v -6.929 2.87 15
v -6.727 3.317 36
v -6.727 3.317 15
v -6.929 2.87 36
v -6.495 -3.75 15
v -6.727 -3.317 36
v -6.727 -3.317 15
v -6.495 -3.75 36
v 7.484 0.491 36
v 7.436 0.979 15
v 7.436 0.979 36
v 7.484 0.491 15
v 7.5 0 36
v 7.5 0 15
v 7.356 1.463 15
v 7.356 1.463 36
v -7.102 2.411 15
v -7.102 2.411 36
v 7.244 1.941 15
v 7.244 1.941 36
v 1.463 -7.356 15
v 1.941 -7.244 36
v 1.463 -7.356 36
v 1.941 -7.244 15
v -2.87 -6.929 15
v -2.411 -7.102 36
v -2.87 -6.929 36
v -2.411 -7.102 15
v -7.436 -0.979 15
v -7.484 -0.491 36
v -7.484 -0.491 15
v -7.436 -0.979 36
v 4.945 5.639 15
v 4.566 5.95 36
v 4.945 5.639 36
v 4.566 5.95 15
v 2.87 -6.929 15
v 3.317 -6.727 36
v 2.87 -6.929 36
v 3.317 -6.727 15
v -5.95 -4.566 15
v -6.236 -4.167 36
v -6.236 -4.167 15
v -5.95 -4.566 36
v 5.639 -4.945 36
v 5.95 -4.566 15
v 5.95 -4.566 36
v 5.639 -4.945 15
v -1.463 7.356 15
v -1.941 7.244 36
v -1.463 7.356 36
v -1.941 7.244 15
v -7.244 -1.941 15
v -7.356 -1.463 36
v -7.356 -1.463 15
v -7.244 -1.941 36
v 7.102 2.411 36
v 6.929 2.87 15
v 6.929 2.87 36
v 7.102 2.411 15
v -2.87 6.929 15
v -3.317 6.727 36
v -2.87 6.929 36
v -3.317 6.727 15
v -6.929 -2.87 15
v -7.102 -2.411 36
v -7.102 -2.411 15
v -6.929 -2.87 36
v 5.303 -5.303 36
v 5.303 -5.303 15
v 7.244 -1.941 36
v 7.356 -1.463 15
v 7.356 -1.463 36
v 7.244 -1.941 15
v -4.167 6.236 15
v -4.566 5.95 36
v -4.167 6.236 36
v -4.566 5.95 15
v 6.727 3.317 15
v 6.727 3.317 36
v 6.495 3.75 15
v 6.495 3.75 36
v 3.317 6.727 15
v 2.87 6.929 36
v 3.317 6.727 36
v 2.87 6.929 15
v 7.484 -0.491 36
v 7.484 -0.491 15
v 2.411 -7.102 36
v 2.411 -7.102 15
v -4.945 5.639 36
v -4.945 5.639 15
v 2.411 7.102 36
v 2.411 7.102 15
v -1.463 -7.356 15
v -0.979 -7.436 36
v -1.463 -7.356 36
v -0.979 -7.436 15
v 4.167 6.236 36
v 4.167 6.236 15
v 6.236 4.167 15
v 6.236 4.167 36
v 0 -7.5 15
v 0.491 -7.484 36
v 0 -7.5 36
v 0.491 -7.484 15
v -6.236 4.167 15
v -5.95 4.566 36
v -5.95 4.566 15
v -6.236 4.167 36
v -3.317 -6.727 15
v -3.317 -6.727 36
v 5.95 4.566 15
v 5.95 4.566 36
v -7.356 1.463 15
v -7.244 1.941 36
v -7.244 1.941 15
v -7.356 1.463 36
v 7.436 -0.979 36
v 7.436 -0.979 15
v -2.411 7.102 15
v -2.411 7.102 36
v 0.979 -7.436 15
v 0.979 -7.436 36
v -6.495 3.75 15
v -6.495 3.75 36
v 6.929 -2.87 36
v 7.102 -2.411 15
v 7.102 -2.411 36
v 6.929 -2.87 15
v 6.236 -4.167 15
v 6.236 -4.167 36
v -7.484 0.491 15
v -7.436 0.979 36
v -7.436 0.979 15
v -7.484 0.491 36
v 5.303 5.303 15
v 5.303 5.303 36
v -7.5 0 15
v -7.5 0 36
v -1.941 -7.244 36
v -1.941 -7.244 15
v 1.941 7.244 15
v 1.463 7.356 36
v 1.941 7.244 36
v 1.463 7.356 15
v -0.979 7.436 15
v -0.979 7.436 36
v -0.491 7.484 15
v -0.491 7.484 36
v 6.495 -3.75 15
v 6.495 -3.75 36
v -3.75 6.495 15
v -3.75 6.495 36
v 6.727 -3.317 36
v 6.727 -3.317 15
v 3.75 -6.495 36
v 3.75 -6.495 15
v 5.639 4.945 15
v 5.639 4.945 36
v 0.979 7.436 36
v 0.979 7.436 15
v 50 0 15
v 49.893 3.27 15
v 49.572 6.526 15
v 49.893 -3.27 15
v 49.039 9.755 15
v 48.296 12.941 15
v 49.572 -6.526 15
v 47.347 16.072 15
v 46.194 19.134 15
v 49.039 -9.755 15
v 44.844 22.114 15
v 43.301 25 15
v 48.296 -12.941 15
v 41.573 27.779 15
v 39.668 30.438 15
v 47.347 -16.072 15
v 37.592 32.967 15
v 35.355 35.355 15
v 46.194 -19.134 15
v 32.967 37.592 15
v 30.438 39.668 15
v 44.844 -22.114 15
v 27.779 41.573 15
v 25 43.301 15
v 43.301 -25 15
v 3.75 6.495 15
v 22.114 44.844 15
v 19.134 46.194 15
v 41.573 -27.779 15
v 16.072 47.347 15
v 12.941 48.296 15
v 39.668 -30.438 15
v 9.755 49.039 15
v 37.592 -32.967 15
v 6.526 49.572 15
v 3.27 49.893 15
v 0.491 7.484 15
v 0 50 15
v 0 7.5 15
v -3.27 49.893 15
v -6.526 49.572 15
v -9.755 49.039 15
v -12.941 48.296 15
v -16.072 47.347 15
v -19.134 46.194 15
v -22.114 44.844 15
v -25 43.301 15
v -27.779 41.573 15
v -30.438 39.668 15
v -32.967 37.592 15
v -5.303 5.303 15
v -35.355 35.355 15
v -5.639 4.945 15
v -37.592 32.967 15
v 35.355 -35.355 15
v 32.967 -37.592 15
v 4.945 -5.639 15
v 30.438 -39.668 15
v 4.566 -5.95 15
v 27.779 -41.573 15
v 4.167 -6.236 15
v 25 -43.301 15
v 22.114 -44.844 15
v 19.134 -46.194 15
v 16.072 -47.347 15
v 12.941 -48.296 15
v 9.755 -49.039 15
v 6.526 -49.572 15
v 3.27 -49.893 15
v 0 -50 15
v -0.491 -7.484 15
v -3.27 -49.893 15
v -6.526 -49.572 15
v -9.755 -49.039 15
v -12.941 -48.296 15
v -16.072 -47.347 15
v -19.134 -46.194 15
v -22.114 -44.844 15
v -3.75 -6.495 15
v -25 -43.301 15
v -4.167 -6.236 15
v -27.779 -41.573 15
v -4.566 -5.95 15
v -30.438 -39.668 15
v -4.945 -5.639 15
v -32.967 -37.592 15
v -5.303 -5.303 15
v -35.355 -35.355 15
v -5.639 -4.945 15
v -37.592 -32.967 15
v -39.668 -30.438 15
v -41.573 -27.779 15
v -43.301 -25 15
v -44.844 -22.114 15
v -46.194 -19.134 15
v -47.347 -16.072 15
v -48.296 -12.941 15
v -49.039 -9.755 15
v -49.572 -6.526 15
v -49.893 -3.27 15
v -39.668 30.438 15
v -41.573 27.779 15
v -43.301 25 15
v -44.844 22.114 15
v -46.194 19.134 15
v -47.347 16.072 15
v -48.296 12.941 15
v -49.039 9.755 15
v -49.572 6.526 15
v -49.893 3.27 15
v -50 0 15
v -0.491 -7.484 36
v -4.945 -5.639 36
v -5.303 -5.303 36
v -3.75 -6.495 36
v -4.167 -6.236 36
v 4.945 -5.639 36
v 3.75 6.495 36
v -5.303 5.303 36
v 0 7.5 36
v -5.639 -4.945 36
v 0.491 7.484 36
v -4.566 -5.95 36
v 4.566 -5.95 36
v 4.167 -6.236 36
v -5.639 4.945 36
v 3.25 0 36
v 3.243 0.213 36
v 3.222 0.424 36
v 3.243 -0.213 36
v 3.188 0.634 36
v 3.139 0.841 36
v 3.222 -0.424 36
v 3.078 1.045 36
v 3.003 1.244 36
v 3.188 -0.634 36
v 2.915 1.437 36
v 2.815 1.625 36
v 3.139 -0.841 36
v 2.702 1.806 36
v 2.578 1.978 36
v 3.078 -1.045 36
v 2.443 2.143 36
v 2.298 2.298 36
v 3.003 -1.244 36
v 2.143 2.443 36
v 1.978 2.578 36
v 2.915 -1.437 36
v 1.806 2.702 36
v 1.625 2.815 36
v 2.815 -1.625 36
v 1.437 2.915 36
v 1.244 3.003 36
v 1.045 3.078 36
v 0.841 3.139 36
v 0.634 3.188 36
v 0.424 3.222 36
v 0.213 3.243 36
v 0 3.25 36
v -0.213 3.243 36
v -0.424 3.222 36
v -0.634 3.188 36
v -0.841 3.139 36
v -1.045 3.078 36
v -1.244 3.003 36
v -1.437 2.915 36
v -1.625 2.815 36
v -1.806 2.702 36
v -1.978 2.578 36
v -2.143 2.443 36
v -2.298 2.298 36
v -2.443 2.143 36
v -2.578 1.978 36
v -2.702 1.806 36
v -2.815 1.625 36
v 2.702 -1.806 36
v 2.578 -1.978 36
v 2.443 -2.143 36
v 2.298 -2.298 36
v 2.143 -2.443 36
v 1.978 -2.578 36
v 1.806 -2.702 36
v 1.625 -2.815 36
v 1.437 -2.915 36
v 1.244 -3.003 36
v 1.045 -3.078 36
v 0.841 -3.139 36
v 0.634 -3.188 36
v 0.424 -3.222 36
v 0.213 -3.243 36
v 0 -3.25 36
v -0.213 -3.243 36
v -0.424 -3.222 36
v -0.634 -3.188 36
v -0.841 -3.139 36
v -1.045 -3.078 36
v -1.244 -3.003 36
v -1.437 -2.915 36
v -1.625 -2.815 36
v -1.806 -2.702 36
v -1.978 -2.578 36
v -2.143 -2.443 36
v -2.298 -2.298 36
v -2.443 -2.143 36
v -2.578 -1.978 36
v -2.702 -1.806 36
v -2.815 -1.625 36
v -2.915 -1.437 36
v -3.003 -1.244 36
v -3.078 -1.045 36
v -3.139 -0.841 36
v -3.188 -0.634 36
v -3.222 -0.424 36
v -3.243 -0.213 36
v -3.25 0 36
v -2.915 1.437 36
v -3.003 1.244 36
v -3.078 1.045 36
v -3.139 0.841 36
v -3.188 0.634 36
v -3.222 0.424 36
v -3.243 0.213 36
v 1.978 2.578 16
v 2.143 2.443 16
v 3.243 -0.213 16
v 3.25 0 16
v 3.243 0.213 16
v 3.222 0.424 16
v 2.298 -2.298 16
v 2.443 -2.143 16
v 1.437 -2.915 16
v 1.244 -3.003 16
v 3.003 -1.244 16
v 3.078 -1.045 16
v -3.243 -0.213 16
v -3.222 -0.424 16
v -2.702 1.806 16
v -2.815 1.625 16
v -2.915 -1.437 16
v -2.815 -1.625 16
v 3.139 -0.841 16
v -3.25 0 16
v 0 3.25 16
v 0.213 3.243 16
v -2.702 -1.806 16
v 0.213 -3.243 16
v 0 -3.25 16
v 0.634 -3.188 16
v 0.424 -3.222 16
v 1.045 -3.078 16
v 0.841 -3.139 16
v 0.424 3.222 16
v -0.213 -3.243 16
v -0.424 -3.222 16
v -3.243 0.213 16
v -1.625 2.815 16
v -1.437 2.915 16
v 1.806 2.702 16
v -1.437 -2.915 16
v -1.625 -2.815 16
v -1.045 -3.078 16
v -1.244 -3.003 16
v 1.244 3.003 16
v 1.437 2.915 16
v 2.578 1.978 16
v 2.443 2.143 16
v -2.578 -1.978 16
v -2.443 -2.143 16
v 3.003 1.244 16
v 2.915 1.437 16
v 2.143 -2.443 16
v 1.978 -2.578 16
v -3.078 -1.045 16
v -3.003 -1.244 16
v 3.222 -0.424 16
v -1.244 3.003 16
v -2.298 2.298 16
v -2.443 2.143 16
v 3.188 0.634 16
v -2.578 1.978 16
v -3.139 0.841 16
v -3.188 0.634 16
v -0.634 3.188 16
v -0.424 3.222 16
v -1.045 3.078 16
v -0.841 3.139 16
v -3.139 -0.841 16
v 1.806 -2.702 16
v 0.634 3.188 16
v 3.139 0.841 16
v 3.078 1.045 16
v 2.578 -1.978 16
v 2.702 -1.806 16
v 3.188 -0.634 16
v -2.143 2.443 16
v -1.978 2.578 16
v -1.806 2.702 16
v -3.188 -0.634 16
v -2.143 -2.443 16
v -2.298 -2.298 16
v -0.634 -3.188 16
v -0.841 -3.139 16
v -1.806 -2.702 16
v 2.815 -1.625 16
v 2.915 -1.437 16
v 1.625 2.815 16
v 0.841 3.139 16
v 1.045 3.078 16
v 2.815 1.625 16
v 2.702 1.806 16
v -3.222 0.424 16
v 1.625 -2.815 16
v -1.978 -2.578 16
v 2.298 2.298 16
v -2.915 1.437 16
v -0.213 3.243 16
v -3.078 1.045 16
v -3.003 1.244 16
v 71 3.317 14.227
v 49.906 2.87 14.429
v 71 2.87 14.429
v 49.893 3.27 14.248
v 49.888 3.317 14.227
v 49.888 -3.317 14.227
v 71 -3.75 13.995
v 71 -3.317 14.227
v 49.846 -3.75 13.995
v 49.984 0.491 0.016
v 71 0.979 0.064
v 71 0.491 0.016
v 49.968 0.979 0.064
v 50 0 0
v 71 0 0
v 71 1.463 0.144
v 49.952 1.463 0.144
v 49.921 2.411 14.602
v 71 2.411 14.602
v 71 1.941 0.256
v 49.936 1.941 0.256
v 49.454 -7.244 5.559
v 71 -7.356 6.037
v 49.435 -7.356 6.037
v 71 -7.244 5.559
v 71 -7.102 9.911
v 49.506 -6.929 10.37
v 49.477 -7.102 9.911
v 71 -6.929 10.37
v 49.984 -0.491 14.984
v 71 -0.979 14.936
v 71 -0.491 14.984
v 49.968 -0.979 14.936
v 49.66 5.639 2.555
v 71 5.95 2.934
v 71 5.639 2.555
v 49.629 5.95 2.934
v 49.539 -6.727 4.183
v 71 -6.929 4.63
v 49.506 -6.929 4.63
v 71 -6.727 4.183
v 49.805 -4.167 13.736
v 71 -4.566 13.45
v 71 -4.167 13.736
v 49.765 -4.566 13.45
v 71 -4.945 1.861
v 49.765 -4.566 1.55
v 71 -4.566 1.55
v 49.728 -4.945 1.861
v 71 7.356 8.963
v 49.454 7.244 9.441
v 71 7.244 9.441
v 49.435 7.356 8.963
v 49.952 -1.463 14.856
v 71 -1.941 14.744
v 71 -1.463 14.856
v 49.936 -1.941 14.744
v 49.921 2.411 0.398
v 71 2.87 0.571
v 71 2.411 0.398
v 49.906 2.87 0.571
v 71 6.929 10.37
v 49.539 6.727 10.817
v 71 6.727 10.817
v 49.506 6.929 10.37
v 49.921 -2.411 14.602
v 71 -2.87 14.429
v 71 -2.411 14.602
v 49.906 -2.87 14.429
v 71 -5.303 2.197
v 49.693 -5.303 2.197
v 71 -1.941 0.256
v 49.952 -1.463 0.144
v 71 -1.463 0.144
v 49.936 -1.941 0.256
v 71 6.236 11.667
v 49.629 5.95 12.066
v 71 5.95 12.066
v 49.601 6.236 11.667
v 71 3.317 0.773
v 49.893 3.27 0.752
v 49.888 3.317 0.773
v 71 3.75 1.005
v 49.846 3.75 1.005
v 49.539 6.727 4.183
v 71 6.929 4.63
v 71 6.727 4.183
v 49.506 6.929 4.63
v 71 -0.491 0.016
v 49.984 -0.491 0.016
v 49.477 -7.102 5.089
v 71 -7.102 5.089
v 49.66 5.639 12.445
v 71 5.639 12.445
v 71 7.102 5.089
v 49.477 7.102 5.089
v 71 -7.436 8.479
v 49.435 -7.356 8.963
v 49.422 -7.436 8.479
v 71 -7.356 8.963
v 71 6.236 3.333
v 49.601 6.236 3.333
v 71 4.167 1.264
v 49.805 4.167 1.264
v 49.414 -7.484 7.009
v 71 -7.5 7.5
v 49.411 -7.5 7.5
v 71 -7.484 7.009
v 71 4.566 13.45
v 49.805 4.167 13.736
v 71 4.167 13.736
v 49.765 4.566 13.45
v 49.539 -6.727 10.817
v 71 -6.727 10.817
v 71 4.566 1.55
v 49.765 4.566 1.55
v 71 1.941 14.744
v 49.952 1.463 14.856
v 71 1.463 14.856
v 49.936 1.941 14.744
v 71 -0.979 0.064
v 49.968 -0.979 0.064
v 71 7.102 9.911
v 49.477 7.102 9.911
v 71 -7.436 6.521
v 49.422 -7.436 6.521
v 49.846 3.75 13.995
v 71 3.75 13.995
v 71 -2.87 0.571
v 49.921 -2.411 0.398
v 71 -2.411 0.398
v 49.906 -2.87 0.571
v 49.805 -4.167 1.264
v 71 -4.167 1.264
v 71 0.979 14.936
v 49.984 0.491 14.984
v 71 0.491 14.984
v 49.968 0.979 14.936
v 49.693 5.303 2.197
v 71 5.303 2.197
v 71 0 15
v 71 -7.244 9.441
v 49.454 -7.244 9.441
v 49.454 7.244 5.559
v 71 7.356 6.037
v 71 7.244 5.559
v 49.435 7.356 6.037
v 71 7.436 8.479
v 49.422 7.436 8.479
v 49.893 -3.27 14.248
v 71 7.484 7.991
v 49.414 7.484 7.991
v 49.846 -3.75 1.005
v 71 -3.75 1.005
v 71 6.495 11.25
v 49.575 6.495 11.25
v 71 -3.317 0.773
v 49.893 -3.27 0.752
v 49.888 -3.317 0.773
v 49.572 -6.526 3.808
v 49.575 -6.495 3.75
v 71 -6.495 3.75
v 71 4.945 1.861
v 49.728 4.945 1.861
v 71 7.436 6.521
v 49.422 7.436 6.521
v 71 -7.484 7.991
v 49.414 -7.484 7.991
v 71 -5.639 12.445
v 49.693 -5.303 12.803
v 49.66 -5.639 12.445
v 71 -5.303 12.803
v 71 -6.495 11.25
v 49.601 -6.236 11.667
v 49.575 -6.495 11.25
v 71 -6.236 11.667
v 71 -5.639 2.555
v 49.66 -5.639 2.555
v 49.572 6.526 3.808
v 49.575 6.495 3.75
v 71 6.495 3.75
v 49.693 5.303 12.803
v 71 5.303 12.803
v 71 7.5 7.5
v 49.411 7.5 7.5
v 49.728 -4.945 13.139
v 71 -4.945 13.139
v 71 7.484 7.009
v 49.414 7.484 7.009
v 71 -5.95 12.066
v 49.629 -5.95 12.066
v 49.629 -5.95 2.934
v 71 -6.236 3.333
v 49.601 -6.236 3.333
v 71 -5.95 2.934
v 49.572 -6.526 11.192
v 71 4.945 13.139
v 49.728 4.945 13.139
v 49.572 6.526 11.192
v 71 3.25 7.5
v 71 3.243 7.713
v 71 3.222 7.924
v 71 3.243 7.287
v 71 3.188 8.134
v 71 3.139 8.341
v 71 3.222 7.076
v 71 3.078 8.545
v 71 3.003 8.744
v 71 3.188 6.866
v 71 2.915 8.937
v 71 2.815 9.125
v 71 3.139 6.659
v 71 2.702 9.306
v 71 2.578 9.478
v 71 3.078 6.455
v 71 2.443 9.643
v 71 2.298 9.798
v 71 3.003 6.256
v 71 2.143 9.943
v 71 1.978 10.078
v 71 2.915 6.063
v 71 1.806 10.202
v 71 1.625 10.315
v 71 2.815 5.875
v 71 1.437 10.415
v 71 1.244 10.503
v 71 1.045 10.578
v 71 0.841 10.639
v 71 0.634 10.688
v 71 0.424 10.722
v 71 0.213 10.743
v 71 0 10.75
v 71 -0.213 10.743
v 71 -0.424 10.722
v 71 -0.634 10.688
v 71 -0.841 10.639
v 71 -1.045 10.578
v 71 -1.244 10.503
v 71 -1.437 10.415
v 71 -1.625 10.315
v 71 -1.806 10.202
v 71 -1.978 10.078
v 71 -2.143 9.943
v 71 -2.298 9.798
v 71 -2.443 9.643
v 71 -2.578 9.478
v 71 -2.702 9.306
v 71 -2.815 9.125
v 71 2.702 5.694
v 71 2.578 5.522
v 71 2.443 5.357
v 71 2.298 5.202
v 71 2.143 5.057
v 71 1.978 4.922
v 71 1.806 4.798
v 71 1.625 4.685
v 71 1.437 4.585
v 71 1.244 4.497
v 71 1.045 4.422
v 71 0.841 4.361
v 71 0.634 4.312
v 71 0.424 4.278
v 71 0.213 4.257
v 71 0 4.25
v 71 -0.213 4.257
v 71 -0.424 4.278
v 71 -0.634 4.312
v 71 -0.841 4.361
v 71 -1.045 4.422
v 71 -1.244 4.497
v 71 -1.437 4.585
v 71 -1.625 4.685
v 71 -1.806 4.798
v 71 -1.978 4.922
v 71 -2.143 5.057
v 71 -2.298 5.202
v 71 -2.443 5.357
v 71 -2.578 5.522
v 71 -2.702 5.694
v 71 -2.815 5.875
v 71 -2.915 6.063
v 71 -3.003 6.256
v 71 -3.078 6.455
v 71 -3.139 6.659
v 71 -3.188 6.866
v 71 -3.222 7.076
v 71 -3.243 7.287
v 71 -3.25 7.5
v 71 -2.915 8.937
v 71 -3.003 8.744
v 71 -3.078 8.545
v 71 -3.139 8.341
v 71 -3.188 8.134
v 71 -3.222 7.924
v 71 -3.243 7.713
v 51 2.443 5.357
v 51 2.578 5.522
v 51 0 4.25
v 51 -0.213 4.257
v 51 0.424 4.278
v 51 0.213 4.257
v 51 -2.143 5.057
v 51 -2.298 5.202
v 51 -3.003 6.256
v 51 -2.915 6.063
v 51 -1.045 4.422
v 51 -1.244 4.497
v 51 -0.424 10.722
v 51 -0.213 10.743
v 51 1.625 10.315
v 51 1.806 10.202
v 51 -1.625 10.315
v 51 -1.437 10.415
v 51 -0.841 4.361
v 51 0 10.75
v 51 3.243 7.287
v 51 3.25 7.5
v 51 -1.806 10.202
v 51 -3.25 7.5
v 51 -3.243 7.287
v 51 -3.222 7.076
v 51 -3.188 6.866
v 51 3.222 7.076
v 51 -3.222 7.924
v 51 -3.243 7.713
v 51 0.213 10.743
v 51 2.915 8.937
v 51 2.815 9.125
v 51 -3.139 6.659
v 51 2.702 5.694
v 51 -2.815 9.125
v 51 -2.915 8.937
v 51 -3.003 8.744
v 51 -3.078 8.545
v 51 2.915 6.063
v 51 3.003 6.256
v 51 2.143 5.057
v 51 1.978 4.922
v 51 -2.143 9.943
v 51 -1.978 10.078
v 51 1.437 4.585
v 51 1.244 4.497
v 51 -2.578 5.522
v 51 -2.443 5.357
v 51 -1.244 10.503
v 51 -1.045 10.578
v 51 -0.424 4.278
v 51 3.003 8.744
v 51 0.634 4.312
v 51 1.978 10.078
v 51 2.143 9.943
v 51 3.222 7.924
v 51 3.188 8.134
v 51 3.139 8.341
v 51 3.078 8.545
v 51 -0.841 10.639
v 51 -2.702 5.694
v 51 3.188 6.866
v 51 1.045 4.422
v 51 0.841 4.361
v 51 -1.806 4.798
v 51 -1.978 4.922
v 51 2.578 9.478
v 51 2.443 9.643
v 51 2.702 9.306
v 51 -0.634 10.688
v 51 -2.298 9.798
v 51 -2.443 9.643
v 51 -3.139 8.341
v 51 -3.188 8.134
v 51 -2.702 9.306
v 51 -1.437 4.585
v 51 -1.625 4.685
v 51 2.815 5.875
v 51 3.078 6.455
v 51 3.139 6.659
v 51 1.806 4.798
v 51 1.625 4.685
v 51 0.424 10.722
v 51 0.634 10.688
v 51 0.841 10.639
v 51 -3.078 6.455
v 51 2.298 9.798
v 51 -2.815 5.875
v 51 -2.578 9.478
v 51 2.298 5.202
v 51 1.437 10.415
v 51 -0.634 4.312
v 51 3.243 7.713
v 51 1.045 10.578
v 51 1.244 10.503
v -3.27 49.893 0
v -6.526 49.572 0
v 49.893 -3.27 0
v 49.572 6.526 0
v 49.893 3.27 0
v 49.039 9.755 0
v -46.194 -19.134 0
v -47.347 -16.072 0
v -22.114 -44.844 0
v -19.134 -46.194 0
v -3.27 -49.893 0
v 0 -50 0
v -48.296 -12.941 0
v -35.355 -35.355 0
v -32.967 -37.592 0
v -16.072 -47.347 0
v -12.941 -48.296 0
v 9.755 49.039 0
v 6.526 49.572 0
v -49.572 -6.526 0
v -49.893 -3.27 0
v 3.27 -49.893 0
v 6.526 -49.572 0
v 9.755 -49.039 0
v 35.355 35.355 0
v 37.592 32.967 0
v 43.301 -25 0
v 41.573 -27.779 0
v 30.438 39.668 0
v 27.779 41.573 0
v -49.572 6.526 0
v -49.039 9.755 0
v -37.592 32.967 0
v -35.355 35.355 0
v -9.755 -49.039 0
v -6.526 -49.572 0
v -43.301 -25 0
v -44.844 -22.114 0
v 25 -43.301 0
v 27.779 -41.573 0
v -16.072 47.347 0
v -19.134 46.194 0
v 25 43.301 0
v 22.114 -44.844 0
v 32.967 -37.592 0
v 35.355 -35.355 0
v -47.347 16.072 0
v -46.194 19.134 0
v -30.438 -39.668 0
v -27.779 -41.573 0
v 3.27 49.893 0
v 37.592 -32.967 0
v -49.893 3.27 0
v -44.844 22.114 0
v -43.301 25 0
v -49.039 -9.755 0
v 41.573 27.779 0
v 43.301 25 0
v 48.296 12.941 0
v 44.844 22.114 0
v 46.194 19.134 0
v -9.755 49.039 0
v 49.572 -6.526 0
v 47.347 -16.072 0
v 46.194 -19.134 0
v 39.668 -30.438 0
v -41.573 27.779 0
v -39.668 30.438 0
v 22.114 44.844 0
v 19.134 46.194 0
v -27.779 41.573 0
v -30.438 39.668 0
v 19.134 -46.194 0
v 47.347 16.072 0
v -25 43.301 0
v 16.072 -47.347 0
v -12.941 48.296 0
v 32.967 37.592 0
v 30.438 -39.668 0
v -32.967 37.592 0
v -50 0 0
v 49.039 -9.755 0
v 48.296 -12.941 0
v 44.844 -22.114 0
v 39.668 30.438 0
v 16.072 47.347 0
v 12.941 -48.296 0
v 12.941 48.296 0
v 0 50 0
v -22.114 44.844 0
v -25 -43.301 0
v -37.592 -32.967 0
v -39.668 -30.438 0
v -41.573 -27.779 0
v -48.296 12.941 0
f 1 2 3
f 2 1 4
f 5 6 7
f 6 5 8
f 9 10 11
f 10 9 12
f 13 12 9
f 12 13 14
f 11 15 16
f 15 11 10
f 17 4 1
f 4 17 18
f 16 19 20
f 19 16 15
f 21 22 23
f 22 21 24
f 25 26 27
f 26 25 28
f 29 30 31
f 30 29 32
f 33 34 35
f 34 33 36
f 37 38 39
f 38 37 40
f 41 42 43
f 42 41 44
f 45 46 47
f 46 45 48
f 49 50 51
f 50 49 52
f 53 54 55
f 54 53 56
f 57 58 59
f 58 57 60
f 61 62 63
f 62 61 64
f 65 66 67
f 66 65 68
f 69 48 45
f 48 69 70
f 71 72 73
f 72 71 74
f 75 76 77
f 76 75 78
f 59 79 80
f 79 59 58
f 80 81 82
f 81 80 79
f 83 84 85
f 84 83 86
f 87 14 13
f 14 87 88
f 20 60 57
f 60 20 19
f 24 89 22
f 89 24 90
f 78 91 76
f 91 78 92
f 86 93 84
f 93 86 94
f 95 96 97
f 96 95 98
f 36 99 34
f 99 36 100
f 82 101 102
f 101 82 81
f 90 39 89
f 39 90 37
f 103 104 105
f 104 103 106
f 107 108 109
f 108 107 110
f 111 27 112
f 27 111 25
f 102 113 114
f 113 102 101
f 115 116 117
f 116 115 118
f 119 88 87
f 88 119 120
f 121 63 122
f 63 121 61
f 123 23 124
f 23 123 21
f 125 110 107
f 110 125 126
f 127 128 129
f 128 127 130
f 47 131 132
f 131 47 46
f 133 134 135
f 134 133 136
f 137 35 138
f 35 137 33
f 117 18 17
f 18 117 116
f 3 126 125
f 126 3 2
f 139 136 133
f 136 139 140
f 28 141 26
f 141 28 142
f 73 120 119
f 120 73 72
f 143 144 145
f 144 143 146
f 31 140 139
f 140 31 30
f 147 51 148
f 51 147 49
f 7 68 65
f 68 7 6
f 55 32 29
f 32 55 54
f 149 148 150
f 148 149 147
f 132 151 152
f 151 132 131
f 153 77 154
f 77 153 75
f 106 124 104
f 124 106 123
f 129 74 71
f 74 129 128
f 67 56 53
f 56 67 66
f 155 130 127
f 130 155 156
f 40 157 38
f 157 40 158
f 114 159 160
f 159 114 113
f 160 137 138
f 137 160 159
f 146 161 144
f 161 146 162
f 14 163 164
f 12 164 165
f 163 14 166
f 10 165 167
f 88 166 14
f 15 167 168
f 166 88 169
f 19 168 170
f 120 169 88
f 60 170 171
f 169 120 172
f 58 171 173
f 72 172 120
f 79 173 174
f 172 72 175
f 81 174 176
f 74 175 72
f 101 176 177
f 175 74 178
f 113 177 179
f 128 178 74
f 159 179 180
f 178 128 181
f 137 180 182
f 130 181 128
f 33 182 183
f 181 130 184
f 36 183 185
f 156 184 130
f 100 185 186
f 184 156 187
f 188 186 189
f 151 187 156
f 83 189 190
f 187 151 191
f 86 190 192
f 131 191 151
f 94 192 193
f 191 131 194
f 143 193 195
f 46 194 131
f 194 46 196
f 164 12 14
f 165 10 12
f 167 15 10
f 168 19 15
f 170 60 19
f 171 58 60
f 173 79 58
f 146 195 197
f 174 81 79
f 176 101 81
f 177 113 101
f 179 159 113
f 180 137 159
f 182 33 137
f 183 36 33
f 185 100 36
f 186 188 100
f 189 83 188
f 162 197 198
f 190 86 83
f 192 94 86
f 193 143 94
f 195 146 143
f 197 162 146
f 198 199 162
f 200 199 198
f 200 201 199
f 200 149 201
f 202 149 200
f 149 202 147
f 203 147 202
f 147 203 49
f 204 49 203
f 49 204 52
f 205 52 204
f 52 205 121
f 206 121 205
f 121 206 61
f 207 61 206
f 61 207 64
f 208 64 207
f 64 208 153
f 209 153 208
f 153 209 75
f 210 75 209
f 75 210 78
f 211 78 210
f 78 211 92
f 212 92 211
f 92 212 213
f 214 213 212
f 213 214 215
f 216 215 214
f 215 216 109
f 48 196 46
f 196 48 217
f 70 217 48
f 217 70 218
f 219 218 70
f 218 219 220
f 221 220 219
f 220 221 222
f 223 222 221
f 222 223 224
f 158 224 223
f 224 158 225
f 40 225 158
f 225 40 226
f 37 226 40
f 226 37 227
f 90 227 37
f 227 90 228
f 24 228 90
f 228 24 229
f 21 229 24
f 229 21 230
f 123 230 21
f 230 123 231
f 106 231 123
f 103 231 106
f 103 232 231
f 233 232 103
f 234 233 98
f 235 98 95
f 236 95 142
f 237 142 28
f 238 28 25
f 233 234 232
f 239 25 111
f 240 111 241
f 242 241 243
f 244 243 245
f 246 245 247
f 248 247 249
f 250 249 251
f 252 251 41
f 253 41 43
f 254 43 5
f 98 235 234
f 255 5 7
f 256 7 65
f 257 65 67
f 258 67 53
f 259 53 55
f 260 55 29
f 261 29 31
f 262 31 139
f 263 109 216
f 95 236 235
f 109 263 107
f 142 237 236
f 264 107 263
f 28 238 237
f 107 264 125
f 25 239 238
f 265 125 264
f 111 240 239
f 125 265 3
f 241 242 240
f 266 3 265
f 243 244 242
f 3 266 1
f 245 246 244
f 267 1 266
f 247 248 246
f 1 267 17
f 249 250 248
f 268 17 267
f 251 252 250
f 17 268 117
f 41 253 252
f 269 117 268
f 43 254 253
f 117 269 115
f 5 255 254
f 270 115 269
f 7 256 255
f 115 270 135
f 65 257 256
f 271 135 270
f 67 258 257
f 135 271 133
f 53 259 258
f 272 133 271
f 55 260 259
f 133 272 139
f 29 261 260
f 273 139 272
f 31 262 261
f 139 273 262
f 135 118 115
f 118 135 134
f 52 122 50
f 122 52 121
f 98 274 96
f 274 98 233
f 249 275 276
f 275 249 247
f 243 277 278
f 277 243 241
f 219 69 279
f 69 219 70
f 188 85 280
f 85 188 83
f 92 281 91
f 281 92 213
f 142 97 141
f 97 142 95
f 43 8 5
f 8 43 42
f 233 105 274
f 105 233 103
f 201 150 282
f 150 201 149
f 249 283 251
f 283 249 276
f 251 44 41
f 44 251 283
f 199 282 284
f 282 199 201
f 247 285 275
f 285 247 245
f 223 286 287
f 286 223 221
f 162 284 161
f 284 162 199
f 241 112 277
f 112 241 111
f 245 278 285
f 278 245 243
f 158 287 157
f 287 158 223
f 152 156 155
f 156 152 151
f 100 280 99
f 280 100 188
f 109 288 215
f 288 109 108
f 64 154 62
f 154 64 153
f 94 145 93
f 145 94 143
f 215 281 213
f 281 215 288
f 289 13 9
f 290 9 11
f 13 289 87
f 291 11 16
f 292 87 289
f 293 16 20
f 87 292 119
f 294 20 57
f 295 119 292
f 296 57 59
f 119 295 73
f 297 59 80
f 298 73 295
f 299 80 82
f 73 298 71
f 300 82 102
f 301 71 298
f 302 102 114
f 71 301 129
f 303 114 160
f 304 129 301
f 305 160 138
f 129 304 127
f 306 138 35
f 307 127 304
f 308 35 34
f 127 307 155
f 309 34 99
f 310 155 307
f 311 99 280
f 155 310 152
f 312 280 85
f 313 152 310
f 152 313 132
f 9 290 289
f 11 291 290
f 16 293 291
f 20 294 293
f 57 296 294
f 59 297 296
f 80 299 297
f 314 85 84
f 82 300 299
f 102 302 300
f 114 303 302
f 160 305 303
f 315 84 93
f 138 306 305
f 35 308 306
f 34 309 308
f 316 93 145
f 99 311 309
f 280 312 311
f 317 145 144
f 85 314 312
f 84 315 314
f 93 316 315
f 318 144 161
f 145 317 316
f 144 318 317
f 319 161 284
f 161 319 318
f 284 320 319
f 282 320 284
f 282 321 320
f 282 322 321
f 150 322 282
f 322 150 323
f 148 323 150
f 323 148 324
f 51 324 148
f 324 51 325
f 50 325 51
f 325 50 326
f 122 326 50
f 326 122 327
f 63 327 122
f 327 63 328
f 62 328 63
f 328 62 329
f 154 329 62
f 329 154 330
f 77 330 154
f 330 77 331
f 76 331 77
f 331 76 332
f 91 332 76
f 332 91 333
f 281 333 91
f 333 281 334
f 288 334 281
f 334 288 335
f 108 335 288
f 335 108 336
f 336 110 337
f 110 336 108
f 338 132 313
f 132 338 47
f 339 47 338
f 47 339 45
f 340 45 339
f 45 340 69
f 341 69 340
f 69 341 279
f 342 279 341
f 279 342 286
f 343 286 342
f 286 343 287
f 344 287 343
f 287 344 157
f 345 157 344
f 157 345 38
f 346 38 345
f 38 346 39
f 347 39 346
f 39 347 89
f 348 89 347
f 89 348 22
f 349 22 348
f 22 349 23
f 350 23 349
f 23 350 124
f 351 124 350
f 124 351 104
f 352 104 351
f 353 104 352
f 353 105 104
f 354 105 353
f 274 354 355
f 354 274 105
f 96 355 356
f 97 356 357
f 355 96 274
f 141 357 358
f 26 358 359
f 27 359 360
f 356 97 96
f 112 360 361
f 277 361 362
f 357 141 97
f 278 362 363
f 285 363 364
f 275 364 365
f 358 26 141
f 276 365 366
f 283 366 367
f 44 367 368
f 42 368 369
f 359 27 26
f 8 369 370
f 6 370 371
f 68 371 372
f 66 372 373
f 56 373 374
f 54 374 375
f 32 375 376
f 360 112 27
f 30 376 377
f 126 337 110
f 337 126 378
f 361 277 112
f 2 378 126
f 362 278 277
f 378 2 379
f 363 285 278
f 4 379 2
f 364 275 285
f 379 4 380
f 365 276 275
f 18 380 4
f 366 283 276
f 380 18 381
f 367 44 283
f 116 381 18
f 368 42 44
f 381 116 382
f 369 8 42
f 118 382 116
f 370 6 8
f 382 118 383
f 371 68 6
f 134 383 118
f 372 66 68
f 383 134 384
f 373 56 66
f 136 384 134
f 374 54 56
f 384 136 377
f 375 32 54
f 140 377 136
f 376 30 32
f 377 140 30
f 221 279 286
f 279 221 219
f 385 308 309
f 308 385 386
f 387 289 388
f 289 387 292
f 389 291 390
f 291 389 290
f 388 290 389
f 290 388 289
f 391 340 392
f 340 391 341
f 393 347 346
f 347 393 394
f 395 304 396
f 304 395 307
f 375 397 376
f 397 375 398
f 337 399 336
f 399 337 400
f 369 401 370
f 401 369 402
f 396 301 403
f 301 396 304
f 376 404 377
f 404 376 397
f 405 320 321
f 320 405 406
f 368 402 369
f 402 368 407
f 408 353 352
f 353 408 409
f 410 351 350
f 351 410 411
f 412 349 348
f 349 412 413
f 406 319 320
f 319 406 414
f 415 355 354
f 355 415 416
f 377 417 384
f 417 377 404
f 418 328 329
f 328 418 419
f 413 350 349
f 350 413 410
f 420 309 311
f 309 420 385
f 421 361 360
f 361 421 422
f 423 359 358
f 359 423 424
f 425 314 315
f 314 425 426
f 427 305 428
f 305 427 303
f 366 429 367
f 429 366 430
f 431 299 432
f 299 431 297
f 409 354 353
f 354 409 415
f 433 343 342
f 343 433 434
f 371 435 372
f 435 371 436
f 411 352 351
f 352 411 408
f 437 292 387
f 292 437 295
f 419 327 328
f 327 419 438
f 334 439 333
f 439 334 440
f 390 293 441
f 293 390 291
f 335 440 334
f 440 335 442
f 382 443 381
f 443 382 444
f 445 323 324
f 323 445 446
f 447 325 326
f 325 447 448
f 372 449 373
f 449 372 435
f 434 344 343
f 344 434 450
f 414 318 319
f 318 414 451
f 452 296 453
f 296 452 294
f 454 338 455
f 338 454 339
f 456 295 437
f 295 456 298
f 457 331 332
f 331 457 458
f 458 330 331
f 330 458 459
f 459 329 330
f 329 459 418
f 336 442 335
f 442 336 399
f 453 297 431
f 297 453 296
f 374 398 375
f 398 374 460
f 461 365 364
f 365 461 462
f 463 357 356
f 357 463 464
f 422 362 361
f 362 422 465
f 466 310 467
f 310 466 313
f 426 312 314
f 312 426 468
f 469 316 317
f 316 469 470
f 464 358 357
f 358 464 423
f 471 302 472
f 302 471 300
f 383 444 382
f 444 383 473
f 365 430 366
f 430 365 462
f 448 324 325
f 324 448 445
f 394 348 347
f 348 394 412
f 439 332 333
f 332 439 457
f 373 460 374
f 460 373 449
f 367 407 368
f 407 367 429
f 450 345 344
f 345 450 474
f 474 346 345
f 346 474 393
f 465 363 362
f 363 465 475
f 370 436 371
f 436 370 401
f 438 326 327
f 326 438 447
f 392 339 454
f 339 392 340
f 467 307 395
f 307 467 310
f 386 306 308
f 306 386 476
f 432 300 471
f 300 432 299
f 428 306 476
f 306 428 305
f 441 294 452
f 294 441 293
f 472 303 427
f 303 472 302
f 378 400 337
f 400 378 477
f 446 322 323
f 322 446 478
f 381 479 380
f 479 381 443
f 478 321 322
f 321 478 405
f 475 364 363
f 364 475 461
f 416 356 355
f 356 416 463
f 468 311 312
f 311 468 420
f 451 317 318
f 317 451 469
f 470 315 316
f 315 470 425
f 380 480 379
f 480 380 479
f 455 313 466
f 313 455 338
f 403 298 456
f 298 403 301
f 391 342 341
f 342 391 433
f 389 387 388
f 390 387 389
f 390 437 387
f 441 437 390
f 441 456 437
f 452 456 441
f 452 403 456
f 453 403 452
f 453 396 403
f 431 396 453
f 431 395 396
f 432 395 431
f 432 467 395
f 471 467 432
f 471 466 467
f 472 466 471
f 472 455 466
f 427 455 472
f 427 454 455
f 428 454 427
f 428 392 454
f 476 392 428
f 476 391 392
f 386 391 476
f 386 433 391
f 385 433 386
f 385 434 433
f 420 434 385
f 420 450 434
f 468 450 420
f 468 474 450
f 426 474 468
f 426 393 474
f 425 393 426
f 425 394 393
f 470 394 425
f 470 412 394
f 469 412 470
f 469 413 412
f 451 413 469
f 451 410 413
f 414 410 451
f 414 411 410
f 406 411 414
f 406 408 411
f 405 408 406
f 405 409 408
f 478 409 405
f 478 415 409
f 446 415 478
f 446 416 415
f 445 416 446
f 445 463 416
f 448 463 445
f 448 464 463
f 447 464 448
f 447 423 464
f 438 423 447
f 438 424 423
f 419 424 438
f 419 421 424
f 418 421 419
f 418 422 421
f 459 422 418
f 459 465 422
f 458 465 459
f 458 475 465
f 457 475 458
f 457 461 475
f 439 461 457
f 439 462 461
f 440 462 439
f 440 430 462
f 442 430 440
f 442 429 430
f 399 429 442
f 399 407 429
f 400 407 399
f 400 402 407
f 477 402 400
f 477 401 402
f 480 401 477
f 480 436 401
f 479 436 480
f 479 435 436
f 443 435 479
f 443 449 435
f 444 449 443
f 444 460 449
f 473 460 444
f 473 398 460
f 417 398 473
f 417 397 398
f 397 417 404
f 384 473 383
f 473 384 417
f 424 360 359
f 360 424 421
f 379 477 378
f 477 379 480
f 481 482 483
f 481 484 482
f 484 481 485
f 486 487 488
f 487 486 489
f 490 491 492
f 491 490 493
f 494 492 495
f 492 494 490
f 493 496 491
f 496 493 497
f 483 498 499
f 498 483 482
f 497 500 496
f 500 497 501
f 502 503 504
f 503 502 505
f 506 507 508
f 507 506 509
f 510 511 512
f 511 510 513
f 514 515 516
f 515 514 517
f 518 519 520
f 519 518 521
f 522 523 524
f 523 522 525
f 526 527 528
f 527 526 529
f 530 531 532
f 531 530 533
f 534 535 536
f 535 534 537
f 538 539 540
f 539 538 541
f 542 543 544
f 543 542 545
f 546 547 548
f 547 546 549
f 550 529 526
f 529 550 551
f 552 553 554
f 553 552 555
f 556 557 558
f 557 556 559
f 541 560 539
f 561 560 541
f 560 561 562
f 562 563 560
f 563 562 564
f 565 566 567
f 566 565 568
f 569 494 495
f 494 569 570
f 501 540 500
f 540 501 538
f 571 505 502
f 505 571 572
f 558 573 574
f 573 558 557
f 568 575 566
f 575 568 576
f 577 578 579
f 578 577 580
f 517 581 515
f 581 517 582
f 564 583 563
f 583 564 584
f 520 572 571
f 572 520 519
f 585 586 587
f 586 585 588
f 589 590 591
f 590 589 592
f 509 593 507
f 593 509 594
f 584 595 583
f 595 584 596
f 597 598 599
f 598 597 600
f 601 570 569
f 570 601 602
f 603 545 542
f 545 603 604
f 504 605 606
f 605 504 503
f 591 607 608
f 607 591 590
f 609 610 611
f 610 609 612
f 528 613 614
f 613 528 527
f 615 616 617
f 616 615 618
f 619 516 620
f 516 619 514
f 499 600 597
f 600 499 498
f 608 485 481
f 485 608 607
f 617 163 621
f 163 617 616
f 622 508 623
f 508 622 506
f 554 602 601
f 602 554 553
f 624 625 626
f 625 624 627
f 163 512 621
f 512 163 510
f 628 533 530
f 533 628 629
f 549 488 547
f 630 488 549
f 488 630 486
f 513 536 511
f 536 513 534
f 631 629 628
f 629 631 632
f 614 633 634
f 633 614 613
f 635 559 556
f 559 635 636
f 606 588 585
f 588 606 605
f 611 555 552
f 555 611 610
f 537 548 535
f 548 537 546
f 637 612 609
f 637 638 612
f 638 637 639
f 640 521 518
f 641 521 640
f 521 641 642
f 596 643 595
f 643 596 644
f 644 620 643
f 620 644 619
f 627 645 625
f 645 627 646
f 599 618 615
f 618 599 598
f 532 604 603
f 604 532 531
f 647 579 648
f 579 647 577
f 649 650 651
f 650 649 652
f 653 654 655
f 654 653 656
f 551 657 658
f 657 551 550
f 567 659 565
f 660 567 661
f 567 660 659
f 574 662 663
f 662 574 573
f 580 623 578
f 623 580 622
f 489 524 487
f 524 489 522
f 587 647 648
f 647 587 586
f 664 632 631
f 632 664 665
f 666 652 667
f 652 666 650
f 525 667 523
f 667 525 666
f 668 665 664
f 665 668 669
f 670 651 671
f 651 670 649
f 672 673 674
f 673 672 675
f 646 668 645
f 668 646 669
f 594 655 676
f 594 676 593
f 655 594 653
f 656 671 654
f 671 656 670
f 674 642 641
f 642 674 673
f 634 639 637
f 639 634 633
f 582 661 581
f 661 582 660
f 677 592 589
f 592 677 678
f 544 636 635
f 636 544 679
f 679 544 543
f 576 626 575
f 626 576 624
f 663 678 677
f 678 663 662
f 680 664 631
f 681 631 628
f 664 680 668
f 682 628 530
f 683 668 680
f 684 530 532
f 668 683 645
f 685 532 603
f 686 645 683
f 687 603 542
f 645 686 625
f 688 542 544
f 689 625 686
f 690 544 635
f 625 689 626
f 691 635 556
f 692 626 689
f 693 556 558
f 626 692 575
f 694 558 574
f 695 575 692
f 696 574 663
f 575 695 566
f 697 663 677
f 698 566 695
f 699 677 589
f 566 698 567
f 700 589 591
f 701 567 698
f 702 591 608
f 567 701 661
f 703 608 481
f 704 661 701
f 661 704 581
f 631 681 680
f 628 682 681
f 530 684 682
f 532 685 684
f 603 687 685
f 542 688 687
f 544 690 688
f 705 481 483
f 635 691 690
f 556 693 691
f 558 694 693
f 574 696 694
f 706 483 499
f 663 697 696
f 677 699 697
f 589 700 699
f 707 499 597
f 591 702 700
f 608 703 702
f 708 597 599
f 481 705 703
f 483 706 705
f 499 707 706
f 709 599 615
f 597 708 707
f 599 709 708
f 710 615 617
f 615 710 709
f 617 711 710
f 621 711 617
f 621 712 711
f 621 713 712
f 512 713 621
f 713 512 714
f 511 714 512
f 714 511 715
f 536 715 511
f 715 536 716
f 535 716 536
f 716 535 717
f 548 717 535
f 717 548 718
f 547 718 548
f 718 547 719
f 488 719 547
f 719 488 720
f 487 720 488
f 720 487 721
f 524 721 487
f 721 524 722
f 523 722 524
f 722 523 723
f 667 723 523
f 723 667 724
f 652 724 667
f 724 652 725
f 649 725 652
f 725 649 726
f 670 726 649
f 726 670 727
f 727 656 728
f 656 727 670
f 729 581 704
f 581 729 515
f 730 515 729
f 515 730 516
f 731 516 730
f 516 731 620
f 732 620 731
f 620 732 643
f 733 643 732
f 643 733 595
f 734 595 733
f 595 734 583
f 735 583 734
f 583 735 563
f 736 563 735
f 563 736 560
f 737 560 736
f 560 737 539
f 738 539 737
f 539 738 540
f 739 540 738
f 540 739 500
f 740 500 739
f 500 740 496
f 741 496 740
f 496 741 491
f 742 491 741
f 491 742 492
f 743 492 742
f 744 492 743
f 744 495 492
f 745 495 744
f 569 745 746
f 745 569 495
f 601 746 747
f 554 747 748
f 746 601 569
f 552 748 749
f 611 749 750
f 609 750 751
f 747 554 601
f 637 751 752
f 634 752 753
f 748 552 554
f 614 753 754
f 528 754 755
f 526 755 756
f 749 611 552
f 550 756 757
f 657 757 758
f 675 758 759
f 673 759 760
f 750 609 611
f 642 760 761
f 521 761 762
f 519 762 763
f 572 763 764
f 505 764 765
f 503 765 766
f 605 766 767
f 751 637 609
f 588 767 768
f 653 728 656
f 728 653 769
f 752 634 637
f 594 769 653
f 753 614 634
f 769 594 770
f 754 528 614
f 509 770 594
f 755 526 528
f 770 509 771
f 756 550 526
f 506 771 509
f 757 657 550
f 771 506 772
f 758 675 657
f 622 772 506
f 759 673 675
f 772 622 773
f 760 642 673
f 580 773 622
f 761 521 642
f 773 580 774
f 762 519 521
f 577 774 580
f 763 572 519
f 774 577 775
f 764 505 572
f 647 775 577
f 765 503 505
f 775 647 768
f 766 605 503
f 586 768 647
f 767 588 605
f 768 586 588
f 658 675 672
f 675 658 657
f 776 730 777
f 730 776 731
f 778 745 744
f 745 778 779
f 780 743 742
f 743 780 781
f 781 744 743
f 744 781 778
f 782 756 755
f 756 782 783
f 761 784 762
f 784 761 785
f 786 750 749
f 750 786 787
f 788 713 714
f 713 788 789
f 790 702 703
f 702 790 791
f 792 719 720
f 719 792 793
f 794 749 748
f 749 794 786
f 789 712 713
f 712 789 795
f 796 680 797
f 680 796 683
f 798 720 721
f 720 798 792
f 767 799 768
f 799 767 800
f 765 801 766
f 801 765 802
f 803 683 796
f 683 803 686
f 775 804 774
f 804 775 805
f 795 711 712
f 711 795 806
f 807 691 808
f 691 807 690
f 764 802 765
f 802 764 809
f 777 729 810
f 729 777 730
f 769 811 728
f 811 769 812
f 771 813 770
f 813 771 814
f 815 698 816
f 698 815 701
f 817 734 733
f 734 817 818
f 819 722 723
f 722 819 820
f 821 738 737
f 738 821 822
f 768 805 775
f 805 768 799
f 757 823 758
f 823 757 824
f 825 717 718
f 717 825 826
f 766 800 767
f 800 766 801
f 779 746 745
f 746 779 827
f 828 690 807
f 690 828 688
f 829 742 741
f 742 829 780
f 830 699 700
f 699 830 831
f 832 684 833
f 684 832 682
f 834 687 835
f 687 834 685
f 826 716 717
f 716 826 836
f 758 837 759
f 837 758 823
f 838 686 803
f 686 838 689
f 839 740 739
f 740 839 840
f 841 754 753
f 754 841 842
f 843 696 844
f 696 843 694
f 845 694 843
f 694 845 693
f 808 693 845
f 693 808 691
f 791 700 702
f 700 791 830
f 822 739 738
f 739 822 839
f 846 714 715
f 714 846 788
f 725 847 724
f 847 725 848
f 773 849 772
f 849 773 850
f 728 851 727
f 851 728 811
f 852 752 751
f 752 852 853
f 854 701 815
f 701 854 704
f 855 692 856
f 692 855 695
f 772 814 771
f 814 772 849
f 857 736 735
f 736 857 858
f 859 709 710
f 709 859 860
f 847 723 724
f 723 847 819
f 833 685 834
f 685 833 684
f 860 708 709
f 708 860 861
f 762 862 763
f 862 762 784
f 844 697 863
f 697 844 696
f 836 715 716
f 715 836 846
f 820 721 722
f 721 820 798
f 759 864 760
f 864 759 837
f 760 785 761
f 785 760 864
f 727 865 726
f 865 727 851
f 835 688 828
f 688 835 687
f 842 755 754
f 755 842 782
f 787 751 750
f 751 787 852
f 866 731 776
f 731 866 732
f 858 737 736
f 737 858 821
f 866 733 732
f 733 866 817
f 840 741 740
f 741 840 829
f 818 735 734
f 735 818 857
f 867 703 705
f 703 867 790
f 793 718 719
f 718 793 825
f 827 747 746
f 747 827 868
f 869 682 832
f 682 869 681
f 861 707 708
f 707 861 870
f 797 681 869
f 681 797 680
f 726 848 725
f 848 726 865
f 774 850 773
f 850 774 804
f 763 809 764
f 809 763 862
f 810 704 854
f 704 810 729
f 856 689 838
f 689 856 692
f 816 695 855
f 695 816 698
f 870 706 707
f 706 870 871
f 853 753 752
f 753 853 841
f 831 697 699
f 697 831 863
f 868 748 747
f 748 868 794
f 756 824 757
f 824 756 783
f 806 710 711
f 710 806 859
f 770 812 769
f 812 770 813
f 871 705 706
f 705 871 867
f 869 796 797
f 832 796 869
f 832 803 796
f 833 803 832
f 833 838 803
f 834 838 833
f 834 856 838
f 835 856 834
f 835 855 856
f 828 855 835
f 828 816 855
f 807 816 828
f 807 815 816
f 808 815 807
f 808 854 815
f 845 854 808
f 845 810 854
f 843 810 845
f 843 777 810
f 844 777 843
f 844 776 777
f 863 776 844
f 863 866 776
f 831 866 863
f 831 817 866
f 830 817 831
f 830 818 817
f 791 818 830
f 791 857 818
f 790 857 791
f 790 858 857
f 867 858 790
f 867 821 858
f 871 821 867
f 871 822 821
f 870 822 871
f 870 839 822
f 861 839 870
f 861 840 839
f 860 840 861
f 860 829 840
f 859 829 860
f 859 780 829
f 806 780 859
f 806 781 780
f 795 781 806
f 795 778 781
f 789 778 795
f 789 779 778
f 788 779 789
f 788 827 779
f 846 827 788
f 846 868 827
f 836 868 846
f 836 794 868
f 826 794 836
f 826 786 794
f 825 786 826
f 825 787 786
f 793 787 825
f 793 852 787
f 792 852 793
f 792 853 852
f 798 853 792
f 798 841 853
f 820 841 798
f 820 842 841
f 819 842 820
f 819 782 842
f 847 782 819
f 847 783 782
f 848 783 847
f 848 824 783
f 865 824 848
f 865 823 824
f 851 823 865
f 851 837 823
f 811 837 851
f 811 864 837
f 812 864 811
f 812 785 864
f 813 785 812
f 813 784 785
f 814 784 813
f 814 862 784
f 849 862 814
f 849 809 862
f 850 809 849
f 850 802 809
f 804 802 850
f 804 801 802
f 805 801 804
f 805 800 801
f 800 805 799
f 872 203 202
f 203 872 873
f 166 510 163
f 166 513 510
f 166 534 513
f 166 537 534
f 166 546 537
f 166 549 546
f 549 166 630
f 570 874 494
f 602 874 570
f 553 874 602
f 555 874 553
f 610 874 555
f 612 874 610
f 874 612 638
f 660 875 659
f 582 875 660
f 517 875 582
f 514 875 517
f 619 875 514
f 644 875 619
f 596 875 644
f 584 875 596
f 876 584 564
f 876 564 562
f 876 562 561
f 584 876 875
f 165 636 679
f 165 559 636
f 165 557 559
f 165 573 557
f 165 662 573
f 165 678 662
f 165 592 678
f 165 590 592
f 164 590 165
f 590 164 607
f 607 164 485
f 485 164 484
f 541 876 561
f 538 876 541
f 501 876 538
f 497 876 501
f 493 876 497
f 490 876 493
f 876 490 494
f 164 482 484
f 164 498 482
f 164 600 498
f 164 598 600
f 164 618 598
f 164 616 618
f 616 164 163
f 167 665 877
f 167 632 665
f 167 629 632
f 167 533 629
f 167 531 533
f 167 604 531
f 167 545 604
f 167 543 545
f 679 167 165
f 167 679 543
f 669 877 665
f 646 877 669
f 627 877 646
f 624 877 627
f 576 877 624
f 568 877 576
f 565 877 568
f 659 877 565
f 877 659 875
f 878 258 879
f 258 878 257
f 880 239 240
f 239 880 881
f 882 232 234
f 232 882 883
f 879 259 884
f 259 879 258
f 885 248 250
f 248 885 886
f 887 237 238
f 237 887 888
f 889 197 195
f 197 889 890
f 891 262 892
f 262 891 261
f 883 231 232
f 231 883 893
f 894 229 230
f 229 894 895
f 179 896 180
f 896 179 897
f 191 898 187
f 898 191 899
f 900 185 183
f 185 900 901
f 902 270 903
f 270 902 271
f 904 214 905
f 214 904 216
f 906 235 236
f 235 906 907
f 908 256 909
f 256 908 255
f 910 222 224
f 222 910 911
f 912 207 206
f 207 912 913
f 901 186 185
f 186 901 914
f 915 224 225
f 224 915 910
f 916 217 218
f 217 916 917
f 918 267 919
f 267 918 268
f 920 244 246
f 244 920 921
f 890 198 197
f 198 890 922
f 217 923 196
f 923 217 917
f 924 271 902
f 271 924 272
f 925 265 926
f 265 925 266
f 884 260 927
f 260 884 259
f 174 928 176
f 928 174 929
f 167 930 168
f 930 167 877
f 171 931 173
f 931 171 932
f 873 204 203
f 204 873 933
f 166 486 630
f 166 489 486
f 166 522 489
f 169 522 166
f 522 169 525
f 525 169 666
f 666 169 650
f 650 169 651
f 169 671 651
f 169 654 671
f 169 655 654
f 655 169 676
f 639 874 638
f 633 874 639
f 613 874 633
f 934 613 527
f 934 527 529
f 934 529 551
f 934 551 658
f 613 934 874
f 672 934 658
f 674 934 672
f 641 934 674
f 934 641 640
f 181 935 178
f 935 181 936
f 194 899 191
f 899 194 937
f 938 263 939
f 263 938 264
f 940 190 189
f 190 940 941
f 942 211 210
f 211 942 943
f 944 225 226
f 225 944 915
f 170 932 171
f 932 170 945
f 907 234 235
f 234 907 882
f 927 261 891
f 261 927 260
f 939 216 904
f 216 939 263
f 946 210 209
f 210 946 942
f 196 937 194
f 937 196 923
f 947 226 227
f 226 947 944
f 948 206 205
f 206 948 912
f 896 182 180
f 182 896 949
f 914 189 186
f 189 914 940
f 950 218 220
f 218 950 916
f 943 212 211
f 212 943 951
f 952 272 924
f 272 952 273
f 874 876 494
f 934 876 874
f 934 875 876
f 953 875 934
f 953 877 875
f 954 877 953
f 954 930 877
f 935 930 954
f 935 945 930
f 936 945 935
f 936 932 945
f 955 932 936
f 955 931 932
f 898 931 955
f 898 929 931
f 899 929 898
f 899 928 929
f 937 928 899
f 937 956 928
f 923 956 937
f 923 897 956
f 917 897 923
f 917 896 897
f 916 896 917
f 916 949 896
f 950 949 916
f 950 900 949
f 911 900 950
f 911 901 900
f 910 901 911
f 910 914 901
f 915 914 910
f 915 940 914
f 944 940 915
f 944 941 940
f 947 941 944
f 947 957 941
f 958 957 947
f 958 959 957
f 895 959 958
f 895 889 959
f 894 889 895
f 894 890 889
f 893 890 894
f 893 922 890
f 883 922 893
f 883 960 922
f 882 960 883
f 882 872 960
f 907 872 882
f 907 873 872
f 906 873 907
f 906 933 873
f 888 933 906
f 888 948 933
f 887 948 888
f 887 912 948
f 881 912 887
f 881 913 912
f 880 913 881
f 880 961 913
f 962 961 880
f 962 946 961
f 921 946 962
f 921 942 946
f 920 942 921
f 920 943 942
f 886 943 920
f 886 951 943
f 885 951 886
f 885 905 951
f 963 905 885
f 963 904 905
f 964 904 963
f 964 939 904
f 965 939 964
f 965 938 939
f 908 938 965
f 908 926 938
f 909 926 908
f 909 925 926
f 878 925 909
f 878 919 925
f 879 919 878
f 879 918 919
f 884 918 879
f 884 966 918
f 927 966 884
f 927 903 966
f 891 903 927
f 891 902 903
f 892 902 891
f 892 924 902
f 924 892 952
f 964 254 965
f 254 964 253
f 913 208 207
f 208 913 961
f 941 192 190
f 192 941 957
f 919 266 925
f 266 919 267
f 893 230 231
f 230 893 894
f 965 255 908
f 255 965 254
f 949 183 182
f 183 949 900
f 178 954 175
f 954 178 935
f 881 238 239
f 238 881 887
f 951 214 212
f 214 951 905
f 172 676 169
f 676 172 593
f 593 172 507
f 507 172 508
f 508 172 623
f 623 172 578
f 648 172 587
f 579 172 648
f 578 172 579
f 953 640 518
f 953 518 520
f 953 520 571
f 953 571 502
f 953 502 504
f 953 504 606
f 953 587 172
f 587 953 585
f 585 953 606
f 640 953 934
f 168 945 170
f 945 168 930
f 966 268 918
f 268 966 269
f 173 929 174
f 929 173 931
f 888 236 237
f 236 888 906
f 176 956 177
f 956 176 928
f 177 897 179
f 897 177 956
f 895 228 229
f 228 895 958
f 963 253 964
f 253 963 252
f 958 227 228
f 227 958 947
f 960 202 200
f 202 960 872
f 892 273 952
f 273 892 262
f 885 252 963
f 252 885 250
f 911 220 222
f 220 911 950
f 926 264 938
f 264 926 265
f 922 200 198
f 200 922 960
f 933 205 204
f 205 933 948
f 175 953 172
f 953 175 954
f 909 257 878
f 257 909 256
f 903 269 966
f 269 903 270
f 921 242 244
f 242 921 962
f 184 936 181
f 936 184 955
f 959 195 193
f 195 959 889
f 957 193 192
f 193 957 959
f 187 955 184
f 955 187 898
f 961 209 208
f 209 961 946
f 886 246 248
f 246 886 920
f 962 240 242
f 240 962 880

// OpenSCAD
// ===================================================================
// Dowel Stand
//
// A thin round base sitting on the table with a taller round post in
// the middle, bored with a hole that a 7 mm wooden dowel presses into.
// The matching angled viewing window that mounts on the other end of
// the dowel is a separate part -- see window.scad.
//
// Axes: X/Y = footprint on the table, Z = up.
// ===================================================================

/* [Dowel (mm)] */
dowel_diameter   = 6.5;     // actual diameter of the wooden dowel; must match window.scad
hole_clearance   = 0;   // added to dowel_diameter for a snug press/slide fit; must match window.scad
dowel_hole_depth = 20;    // how deep the dowel is expected to sit in the hole; must match window.scad

/* [Stand base disc (mm)] */
base_diameter         = 100;  // thin disc that sits on the table
base_height_no_tether = 4;    // thickness of the base disc when has_tether_dowel is false; when true, the disc is instead made as thick as tether_diameter so the horizontal cylinder sits flush within the full slab -- see base_height below

/* [Stand center post (mm)] */
post_diameter = 15;   // taller cylinder in the middle, holds the dowel
post_height   = dowel_hole_depth+1;   // height of the post above the base disc

/* [Tether dowel (mm)] */
has_tether_dowel = true;   // adds a horizontal cylinder at the base, bored for a second dowel that ties this stand to mirror-spinner-stand.scad at a fixed distance; must match that file's own has_tether_dowel toggle
tether_diameter  = post_diameter;      // outer diameter of the horizontal cylinder; matches the vertical post
tether_length    = dowel_hole_depth+1; // how far the cylinder extends beyond the base disc's edge

/* [Rendering] */
$fn = 96;

// ===== Derived values =====
dowel_hole_d = dowel_diameter + hole_clearance;
tether_embed = tether_diameter / 2; // how far the horizontal cylinder is buried into the base disc for a solid fused joint; also its resting height above the table, since it sits tangent to Z=0 like the base disc
base_height  = has_tether_dowel ? tether_diameter : base_height_no_tether; // full disc thickness; matches the tether cylinder's height when enabled so it sits flush within the slab (top and bottom) instead of poking out above a thin disc

// ===== Checks =====
assert(base_diameter > post_diameter,
    "base_diameter should be larger than post_diameter");
assert(post_diameter > dowel_hole_d,
    "post_diameter must be larger than the dowel hole diameter");
assert(post_height > dowel_hole_depth,
    "post_height should be greater than dowel_hole_depth so the hole doesn't pass all the way through");
assert(tether_diameter > dowel_hole_d,
    "tether_diameter must be larger than the dowel hole diameter");
assert(tether_length > dowel_hole_depth,
    "tether_length should be greater than dowel_hole_depth so the hole doesn't pass all the way through");
assert(base_diameter / 2 > tether_embed,
    "base_diameter is too small for the tether cylinder to embed into the disc");

// ===== Stand =====

// Horizontal cylinder resting on the table (tangent at Z=0, like the
// base disc itself) and embedded into the disc's edge, bored with a
// hole (open at the outward tip) for a second dowel. That dowel spans
// over to the matching cylinder on mirror-spinner-stand.scad, holding
// the two stands a fixed distance apart.
module tether_post() {
    translate([base_diameter / 2 - tether_embed, 0, tether_embed])
        rotate([0, 90, 0])
            difference() {
                cylinder(d = tether_diameter, h = tether_embed + tether_length);

                // dowel hole, open at the outward tip
                translate([0, 0, tether_embed + tether_length - dowel_hole_depth])
                    cylinder(d = dowel_hole_d, h = dowel_hole_depth + 1);
            }
}

module stand() {
    union() {
        // thin base disc on the table
        cylinder(d = base_diameter, h = base_height);

        // taller center post
        translate([0, 0, base_height])
            difference() {
                cylinder(d = post_diameter, h = post_height);

                // dowel hole, open at the top
                translate([0, 0, post_height - dowel_hole_depth])
                    cylinder(d = dowel_hole_d, h = dowel_hole_depth + 1);
            }

        if (has_tether_dowel)
            tether_post();
    }
}

echo(str("Dowel hole diameter: ", dowel_hole_d, " mm (dowel ", dowel_diameter,
         " mm + ", hole_clearance, " mm clearance)"));
echo(str("Stand: base d=", base_diameter, " x h=", base_height,
         " mm, post d=", post_diameter, " x h=", post_height, " mm"));
echo(has_tether_dowel
    ? str("Tether dowel cylinder: d=", tether_diameter, " mm, extends ", tether_length,
          " mm beyond the base disc's edge; base disc thickness raised to match (h=", base_height, " mm)")
    : "Tether dowel cylinder: disabled");

stand();
